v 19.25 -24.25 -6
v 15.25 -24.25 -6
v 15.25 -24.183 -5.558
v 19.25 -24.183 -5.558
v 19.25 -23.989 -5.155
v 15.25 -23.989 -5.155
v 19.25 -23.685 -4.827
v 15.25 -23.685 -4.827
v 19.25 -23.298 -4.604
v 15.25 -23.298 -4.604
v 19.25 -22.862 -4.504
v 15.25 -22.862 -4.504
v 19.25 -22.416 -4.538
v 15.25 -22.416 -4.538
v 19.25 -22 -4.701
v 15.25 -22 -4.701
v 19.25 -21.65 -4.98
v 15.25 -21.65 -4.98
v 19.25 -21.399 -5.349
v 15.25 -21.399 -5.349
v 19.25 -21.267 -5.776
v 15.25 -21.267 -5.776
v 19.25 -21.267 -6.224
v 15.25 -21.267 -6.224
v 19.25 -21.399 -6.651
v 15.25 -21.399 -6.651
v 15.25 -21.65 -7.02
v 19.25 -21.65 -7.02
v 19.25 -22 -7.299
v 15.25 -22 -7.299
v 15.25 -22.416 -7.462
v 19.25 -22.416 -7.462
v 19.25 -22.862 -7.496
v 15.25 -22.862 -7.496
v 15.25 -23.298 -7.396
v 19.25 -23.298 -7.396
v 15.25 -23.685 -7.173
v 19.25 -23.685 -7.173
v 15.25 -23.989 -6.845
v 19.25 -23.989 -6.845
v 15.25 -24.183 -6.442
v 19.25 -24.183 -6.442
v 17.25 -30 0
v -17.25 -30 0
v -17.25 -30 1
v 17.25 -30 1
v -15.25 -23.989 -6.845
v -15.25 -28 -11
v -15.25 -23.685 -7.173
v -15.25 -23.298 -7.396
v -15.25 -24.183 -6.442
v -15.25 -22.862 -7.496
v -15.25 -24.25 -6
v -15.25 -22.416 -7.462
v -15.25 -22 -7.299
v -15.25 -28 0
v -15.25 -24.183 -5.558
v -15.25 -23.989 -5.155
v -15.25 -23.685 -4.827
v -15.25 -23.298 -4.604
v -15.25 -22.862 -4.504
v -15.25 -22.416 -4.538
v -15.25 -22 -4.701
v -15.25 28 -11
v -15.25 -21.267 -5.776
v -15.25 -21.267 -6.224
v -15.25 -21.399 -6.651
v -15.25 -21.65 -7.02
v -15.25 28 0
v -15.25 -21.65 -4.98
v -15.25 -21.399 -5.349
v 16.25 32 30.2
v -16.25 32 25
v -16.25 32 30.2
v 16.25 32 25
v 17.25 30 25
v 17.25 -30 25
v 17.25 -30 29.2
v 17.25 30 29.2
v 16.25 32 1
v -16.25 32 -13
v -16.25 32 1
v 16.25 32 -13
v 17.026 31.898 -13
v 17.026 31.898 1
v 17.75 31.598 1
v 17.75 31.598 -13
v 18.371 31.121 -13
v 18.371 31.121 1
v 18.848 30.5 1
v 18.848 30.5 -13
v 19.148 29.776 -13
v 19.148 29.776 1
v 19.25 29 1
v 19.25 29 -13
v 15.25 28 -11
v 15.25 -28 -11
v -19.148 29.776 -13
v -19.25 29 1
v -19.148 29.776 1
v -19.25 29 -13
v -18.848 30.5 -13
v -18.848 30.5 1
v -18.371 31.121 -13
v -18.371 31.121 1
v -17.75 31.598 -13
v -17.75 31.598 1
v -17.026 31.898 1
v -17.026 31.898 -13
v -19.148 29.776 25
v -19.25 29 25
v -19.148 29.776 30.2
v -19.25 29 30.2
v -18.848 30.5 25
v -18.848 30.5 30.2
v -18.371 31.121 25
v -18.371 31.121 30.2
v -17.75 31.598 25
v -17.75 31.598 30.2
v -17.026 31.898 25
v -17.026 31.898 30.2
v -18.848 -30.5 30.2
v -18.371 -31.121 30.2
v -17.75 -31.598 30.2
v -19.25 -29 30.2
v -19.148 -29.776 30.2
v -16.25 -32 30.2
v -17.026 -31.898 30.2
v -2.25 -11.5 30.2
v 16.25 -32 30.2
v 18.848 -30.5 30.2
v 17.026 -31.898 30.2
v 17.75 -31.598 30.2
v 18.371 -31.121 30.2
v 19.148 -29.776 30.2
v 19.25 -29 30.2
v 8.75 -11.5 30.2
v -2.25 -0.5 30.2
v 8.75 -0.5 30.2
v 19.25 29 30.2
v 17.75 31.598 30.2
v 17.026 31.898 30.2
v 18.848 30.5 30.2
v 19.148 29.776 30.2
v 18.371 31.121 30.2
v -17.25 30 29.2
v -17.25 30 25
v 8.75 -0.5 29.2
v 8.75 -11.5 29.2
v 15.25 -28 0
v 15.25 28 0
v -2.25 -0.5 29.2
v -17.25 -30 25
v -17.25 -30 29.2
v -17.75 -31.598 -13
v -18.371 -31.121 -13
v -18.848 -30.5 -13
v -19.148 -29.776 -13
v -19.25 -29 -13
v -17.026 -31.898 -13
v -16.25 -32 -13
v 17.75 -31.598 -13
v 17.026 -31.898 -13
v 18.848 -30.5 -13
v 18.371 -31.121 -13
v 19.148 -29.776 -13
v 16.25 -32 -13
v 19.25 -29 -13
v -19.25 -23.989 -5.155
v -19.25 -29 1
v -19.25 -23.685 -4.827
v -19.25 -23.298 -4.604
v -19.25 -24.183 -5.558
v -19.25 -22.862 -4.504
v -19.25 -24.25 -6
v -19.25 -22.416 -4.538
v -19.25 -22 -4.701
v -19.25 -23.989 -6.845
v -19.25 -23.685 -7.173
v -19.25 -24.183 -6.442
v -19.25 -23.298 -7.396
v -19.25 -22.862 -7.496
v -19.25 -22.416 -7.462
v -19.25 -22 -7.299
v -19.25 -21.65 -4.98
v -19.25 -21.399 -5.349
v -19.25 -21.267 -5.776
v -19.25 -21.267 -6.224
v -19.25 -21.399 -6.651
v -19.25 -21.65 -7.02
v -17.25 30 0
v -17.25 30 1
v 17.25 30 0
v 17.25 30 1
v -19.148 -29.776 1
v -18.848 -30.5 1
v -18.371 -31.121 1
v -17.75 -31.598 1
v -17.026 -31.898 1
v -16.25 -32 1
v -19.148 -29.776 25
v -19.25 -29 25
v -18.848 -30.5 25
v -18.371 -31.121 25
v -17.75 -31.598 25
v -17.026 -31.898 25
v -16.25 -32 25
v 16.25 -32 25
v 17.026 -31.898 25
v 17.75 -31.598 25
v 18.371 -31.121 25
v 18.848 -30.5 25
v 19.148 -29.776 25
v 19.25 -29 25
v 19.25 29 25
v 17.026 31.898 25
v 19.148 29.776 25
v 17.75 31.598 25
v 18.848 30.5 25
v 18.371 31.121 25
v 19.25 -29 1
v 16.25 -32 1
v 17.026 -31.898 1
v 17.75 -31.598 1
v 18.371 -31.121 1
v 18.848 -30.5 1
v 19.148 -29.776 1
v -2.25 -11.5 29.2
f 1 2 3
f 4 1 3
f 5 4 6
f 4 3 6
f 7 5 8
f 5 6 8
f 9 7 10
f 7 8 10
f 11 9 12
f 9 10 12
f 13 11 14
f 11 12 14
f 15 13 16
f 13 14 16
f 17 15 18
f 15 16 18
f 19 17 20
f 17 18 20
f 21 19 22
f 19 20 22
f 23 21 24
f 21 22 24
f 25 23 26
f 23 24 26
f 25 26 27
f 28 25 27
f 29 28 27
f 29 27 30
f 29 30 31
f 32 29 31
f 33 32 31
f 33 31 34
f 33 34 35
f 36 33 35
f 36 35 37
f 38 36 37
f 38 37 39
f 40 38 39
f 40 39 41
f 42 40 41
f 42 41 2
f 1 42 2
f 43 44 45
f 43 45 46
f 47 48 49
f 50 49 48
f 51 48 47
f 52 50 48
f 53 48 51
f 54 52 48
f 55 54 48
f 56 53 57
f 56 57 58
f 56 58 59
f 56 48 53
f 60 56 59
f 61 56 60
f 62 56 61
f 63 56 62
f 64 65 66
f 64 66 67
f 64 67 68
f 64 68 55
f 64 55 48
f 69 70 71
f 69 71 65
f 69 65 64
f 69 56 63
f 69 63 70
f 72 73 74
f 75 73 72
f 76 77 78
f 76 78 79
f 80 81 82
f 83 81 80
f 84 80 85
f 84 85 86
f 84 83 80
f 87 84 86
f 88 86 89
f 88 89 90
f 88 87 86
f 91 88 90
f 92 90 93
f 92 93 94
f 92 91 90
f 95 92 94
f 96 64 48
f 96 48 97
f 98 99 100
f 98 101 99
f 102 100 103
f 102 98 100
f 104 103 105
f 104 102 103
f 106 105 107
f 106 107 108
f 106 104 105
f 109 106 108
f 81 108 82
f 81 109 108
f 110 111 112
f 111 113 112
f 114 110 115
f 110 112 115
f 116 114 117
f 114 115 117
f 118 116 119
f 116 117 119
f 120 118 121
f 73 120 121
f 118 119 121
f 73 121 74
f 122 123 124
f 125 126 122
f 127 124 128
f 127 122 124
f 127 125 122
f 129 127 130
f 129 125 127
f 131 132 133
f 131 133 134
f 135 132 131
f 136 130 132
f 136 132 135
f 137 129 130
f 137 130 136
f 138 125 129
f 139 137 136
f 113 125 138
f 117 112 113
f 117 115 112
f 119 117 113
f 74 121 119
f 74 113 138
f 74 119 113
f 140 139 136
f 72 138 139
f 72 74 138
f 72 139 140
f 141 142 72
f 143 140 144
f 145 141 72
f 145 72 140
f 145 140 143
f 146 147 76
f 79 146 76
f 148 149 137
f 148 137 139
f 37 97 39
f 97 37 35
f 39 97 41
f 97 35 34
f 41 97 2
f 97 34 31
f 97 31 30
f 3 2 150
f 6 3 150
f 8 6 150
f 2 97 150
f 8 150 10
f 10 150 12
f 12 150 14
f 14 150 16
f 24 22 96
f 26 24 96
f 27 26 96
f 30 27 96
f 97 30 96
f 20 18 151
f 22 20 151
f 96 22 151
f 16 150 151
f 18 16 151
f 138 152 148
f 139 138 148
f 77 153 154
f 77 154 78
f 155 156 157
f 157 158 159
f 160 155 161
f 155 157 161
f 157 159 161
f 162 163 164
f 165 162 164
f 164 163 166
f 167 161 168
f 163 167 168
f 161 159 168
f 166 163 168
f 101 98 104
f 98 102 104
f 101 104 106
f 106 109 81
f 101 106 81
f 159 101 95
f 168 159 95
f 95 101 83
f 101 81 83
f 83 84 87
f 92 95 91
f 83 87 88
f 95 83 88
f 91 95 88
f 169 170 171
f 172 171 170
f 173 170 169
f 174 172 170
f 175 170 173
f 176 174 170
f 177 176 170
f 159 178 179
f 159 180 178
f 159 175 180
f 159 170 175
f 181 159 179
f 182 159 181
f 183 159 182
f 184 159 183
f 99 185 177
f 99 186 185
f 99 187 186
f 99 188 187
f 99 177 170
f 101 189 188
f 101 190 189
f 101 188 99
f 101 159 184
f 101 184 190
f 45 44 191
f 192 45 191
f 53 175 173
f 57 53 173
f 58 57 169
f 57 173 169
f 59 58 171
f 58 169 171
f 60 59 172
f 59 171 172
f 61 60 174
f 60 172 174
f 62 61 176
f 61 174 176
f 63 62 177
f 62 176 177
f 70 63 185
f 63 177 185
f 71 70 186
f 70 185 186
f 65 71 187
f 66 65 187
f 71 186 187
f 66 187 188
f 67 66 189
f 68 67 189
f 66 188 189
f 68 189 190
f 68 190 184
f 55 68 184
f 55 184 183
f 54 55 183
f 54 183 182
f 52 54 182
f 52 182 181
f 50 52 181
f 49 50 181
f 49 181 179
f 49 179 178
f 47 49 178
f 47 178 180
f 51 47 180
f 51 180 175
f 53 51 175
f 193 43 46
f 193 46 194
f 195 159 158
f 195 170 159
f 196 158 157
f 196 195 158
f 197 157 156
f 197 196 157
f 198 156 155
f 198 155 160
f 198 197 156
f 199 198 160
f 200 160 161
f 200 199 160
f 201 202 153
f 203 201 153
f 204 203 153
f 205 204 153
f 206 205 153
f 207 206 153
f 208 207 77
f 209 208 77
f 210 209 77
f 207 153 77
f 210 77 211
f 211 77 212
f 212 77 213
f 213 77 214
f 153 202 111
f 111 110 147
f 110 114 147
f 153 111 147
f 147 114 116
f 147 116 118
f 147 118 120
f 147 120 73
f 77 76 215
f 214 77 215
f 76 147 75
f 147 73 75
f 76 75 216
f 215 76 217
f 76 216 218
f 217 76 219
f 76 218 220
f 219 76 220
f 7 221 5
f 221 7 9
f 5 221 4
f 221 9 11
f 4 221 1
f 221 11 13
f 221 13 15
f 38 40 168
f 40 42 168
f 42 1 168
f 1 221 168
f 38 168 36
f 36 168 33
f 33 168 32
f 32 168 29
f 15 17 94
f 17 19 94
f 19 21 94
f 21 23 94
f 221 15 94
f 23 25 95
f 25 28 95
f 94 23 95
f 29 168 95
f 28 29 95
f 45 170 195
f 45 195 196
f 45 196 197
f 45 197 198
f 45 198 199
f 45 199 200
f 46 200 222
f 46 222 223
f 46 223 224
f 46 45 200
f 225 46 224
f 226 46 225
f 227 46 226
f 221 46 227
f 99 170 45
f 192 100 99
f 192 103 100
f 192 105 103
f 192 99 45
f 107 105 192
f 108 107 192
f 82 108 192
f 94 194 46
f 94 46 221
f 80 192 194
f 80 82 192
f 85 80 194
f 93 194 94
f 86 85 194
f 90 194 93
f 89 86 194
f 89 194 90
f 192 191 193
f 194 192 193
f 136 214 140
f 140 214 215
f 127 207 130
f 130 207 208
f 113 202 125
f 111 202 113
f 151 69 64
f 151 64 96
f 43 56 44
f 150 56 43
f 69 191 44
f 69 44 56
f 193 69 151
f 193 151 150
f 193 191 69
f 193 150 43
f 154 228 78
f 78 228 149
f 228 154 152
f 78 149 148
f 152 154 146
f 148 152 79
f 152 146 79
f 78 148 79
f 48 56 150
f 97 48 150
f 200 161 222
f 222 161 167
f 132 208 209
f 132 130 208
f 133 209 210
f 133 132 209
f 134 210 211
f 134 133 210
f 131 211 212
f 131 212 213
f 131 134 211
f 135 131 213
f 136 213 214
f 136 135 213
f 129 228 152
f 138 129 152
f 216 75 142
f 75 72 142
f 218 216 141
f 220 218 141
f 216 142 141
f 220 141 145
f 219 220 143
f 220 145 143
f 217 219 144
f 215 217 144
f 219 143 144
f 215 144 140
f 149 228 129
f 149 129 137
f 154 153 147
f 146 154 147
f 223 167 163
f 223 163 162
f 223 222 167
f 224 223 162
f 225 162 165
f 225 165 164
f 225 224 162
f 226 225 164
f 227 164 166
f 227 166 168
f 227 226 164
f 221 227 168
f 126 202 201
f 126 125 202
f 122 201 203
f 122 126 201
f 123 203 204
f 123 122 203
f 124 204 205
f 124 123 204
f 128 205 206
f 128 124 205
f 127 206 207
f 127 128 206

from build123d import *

# Parameters (mm, degrees)
F0_W      = 38.5
F0_H      = 64
F0_W_2    = 34.5
F0_H_2    = 60
F0_W_3    = 30.5
F0_H_3    = 56
F1_DEPTH  = 13
F2_DEPTH  = 1
F3_DEPTH  = 11
F4_R      = 3
F5_R      = 1.5
F6_DEPTH  = 38.501
F8_W      = 38.5
F8_H      = 64
F8_W_2    = 34.5
F8_H_2    = 60
F8_W_3    = 30.5
F8_H_3    = 56
F8_W_4    = 11
F8_H_4    = 11
F9_DEPTH  = 5.2
F10_DEPTH = 4.2
F11_R     = 3


with BuildPart() as f1:
    # F0 (on Top) → F1 (new body)
    with BuildSketch(Plane.XY):
        Rectangle(F0_W, F0_H)
        Rectangle(F0_W_2, F0_H_2, mode=Mode.SUBTRACT)
        Rectangle(F0_W_2, F0_H_2)
        Rectangle(F0_W_3, F0_H_3, mode=Mode.SUBTRACT)
        Rectangle(F0_W_3, F0_H_3)
    extrude(amount=-F1_DEPTH)

    # F0 (on Top) → F2 (join)
    with BuildSketch(Plane.XY):
        Rectangle(F0_W, F0_H)
        Rectangle(F0_W_2, F0_H_2, mode=Mode.SUBTRACT)
    extrude(amount=F2_DEPTH)

    # F0 (on Top) → F3 (cut)
    with BuildSketch(Plane.XY):
        Rectangle(F0_W_3, F0_H_3)
    extrude(amount=-F3_DEPTH, mode=Mode.SUBTRACT)

    # F4
    f4_edges = [f1.edges().sort_by_distance(p)[0] for p in [
        (-19.25, -32, -6),
        (19.25, -32, -6),
        (19.25, 32, -6),
        (-19.25, 32, -6),
    ]]
    fillet(f4_edges, radius=F4_R)

    # F5 (on face) → F6 (cut, through all)
    with BuildSketch(Plane(origin=(-19.25, 0, 0), x_dir=(0, -1, 0), z_dir=(-1, 0, 0))):
        with Locations((22.75, -6)):
            Circle(F5_R)
    extrude(amount=-F6_DEPTH, mode=Mode.SUBTRACT)


with BuildPart() as f9:
    # F8 (on offset) → F9 (new body)
    with BuildSketch(Plane.XY.offset(25)):
        Rectangle(F8_W, F8_H)
        Rectangle(F8_W_2, F8_H_2, mode=Mode.SUBTRACT)
        Rectangle(F8_W_2, F8_H_2)
        Rectangle(F8_W_3, F8_H_3, mode=Mode.SUBTRACT)
        Rectangle(F8_W_3, F8_H_3)
        with Locations((3.25, -6)):
            Rectangle(F8_W_4, F8_H_4, mode=Mode.SUBTRACT)
    extrude(amount=F9_DEPTH)

    # F8 (on offset) → F10 (cut)
    with BuildSketch(Plane.XY.offset(25)):
        Rectangle(F8_W_2, F8_H_2)
        Rectangle(F8_W_3, F8_H_3, mode=Mode.SUBTRACT)
        Rectangle(F8_W_3, F8_H_3)
        with Locations((3.25, -6)):
            Rectangle(F8_W_4, F8_H_4, mode=Mode.SUBTRACT)
    extrude(amount=F10_DEPTH, mode=Mode.SUBTRACT)

    # F11
    f11_edges = [f9.edges().sort_by_distance(p)[0] for p in [
        (-19.25, -32, 27.6),
        (19.25, -32, 27.6),
        (19.25, 32, 27.6),
        (-19.25, 32, 27.6),
    ]]
    fillet(f11_edges, radius=F11_R)


solid = Compound([f1.part, f9.part])
